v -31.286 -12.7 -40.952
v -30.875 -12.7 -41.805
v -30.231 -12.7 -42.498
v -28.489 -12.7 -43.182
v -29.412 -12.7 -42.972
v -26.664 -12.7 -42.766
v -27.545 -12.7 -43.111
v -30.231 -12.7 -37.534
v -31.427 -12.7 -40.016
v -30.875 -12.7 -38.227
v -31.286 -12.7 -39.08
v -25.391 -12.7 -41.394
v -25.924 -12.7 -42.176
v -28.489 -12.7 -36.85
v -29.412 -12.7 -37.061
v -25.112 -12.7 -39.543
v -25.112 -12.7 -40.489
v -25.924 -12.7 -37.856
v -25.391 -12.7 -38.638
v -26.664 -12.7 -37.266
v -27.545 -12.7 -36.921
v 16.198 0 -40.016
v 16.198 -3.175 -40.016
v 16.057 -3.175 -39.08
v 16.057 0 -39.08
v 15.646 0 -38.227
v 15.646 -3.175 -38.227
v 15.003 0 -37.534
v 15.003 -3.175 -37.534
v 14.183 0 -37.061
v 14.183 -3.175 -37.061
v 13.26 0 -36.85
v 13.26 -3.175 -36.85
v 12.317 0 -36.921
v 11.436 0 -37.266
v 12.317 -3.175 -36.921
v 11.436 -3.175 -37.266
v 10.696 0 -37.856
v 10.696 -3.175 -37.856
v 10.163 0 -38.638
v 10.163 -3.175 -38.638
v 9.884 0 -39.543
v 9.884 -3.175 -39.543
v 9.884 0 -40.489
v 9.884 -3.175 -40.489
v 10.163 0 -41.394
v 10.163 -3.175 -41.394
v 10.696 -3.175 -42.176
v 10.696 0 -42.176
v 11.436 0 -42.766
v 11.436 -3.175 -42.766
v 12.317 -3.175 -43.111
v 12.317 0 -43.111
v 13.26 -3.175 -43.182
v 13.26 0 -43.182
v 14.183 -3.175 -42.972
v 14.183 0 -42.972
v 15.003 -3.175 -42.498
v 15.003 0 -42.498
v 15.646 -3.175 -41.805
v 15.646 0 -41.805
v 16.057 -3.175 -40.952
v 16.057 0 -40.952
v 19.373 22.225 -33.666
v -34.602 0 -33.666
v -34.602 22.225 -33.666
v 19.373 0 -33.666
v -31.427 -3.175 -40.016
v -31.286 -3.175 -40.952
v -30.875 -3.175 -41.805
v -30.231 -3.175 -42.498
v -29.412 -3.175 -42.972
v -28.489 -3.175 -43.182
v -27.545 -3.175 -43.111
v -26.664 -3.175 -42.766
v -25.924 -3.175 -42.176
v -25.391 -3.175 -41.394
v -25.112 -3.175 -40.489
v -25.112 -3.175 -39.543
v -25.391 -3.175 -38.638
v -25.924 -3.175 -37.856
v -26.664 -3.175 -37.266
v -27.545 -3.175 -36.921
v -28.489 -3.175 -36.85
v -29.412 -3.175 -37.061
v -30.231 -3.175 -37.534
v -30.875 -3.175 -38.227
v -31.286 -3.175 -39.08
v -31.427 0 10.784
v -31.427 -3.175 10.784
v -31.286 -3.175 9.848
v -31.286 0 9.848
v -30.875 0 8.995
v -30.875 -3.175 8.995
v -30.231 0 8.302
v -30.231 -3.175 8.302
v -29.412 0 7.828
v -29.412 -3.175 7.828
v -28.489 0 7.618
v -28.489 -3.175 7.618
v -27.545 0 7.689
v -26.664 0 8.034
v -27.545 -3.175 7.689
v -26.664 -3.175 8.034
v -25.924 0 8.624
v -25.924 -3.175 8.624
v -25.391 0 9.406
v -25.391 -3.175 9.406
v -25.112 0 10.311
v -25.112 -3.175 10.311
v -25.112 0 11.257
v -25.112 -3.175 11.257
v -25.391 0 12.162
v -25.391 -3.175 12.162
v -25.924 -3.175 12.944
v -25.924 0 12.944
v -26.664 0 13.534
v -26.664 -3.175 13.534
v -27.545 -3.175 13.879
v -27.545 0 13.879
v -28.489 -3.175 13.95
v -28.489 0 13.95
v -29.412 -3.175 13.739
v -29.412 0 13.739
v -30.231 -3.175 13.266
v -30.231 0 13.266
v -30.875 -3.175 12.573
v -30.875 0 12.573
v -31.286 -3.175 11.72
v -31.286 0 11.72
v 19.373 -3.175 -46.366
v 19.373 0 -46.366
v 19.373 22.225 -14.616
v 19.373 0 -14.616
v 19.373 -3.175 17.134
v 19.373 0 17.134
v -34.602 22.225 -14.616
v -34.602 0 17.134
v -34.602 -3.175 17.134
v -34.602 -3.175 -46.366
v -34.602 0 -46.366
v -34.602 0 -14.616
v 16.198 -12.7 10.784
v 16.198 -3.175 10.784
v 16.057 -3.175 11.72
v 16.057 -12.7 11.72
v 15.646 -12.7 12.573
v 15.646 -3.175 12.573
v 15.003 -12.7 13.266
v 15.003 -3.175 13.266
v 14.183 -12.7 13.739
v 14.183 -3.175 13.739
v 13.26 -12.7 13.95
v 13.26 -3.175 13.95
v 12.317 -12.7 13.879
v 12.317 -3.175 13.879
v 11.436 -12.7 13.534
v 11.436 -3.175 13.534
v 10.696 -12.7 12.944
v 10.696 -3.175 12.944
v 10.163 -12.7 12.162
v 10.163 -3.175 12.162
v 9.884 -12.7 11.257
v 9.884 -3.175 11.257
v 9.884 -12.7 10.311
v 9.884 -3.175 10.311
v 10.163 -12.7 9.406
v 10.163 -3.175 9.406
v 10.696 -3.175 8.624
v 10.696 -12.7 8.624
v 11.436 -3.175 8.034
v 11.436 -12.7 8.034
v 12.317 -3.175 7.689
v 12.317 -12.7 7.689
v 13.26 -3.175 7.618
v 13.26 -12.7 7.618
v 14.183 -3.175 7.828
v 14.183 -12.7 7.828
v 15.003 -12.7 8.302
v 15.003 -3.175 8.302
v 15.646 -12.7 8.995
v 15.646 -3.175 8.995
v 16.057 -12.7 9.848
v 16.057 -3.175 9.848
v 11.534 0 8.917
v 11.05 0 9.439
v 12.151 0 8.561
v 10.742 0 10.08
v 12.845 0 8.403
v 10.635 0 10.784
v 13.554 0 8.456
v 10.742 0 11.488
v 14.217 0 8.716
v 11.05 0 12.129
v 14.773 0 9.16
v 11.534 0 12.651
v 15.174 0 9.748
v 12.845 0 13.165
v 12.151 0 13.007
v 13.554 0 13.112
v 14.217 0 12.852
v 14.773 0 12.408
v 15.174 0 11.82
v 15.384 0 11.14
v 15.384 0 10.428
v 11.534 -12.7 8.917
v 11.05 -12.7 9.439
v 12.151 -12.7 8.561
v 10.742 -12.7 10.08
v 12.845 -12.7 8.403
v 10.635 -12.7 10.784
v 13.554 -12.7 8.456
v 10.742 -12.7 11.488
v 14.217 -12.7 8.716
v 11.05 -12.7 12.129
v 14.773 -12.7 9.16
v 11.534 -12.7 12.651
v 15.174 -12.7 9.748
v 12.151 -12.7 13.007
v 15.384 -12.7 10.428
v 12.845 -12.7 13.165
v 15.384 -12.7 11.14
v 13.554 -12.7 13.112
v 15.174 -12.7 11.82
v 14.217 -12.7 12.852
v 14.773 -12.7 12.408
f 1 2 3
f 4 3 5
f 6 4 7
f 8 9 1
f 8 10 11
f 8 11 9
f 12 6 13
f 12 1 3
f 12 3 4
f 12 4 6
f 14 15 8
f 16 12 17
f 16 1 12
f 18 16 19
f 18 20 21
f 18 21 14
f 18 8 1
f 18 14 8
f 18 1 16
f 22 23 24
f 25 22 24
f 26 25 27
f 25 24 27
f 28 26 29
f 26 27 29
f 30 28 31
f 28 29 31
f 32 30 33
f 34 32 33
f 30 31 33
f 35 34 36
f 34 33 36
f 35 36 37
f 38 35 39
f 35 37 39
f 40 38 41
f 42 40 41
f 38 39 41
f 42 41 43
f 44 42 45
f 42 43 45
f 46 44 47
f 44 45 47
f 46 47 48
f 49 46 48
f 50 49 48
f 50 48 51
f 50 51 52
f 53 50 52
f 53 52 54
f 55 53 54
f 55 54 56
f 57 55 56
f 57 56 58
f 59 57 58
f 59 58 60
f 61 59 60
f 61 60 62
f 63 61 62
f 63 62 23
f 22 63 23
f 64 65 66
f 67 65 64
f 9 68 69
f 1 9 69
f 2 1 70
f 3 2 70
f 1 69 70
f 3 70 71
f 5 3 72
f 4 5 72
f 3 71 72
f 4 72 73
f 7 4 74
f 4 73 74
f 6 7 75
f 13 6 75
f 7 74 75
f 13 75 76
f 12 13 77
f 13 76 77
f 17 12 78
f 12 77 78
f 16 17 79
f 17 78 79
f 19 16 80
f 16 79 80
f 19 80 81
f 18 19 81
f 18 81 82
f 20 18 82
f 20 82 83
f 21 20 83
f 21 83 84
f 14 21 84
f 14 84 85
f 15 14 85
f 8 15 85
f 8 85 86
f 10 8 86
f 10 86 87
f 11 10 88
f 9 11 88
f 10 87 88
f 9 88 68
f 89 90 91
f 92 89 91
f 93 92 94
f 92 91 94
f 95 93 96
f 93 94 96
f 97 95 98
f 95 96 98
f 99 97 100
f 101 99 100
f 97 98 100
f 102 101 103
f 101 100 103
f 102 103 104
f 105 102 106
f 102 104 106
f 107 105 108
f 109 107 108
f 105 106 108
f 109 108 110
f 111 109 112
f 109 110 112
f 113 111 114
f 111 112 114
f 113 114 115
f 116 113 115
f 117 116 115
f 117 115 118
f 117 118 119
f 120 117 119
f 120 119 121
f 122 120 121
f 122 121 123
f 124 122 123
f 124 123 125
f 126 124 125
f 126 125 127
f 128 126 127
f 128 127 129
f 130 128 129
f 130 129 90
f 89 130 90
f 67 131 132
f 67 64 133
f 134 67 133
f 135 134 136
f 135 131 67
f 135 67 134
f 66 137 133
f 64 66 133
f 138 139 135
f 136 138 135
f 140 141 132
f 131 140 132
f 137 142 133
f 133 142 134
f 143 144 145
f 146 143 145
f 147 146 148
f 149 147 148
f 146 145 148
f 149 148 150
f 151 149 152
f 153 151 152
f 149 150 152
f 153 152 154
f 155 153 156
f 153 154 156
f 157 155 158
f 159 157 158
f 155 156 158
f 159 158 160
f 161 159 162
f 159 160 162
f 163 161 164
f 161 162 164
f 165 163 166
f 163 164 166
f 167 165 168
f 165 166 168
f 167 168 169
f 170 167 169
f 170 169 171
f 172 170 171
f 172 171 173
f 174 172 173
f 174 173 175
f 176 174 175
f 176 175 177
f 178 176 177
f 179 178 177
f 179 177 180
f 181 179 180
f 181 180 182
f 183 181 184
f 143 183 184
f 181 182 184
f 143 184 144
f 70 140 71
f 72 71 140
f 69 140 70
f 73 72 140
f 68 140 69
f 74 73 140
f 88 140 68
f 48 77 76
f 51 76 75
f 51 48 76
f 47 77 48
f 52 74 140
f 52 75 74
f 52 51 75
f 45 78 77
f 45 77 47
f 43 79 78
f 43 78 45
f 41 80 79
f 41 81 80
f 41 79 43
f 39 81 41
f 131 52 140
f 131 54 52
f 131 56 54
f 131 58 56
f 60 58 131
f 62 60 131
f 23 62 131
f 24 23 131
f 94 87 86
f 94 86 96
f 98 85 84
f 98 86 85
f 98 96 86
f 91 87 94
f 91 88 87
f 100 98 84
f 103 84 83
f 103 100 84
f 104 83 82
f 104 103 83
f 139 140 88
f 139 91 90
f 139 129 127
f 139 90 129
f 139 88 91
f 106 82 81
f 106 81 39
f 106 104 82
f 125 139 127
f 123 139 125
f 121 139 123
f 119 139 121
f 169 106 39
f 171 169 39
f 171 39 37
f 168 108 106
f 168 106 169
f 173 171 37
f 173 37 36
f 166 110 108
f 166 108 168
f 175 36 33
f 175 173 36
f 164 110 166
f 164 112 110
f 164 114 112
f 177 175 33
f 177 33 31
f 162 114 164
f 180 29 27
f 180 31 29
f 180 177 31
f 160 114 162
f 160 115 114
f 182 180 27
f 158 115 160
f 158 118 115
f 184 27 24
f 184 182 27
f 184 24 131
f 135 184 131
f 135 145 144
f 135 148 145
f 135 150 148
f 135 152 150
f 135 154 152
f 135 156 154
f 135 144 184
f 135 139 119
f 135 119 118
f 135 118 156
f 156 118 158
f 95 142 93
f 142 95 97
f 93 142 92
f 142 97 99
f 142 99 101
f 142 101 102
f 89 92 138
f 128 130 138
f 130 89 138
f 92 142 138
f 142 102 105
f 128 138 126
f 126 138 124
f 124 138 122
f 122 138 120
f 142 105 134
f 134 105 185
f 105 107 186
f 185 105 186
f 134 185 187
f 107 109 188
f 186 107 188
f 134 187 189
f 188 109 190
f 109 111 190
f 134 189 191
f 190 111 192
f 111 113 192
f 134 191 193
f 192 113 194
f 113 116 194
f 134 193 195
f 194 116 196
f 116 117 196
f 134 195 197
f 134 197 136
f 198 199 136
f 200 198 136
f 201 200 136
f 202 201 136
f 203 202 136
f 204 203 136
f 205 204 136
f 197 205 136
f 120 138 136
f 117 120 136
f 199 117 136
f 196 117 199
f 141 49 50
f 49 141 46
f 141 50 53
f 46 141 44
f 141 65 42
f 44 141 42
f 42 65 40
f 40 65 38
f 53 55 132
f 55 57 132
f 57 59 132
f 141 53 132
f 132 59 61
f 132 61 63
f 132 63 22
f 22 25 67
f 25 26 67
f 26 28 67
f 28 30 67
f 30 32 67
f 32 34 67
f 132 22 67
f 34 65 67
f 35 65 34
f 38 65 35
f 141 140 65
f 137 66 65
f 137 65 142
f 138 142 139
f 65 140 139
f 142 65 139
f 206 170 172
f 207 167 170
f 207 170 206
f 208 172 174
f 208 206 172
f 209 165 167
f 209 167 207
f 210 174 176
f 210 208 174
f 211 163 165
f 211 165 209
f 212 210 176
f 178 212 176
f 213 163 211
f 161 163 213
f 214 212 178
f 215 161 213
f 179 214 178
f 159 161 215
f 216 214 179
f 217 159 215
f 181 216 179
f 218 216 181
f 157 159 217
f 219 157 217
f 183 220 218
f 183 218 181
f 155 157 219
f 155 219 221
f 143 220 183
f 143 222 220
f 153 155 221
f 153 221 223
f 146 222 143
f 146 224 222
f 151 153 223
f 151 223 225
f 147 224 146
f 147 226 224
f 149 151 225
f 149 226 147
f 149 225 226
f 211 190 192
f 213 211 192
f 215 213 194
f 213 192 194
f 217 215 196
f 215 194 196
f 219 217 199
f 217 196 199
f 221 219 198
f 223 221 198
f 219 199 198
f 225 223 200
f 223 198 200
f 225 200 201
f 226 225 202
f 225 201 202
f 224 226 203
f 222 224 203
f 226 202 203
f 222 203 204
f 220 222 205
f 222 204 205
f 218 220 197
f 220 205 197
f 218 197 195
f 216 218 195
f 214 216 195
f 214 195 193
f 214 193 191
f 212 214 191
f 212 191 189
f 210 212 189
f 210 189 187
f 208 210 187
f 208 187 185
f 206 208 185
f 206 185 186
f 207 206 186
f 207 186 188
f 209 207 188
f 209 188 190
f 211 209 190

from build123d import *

# Parameters (mm, degrees)
F0_W      = 53.975
F0_H      = 12.7
F1_DEPTH  = 3.175
F3_DEPTH  = 9.525
F4_R      = 3.175
F5_DEPTH  = 3.176
F6_W      = 53.975
F6_H      = 19.05
F7_DEPTH  = 25.4
F8_W      = 53.975
F8_H      = 31.75
F9_DEPTH  = 3.175
F11_DEPTH = 25.401
F12_R     = 3.175
F13_DEPTH = 9.525
F15_DEPTH = 15.4432


# Not quite as in the source:
# - a length typed as a fraction of an inch, garbled in the dataset ("3 / 203.2 mm" for 3/8 in), is restored


with BuildPart() as f1:
    # F0 (on Front) → F1 (new body)
    with BuildSketch(Plane.XZ):
        with Locations((-7.6144175836, -40.016034618)):
            Rectangle(F0_W, F0_H)
    extrude(amount=F1_DEPTH)

    # F2 (on face) → F3 (join)
    with BuildSketch(Plane.XZ.offset(3.175)):
        with BuildLine():
            ThreePointArc((-25.0769175836, -40.016034618), (-28.2519175836, -36.841034618), (-31.4269175836, -40.016034618))
            ThreePointArc((-31.4269175836, -40.016034618), (-28.2519175836, -43.191034618), (-25.0769175836, -40.016034618))
        make_face()
    extrude(amount=F3_DEPTH)

    # F4 (on face) → F5 (cut, through all)
    with BuildSketch(Plane.XZ.offset(3.175)):
        with Locations((13.0230824164, -40.016034618)):
            Circle(F4_R)
    extrude(amount=-F5_DEPTH, mode=Mode.SUBTRACT)

    # F6 (on face) → F7 (join)
    with BuildSketch(Plane.XZ.offset(3.175)):
        with Locations((-7.6144175836, -24.141034618)):
            Rectangle(F6_W, F6_H)
    extrude(amount=-F7_DEPTH)

    # F8 (on face) → F9 (join)
    with BuildSketch(Plane.XZ.offset(3.175)):
        with Locations((-7.6144175836, 1.258965382)):
            Rectangle(F8_W, F8_H)
    extrude(amount=-F9_DEPTH)

    # F10 (on face) → F11 (cut, through all)
    with BuildSketch(Plane.XZ.offset(3.175)):
        with BuildLine():
            ThreePointArc((-25.0769175836, 10.783965382), (-28.2519175836, 13.958965382), (-31.4269175836, 10.783965382))
            ThreePointArc((-31.4269175836, 10.783965382), (-28.2519175836, 7.608965382), (-25.0769175836, 10.783965382))
        make_face()
    extrude(amount=-F11_DEPTH, mode=Mode.SUBTRACT)

    # F12 (on face) → F13 (join)
    with BuildSketch(Plane.XZ.offset(3.175)):
        with Locations((13.0230824164, 10.783965382)):
            Circle(F12_R)
    extrude(amount=F13_DEPTH)

    # F14 (on face) → F15 (cut)
    with BuildSketch(Plane(origin=(0, 0, 0), x_dir=(-1, 0, 0), z_dir=(0, 1, 0))):
        with BuildLine():
            ThreePointArc((-15.4106824164, 10.783965382), (-13.0230824164, 8.396365382), (-10.6354824164, 10.783965382))
            ThreePointArc((-10.6354824164, 10.783965382), (-13.0230824164, 13.171565382), (-15.4106824164, 10.783965382))
        make_face()
    extrude(amount=-F15_DEPTH, mode=Mode.SUBTRACT)


solid = f1.part
